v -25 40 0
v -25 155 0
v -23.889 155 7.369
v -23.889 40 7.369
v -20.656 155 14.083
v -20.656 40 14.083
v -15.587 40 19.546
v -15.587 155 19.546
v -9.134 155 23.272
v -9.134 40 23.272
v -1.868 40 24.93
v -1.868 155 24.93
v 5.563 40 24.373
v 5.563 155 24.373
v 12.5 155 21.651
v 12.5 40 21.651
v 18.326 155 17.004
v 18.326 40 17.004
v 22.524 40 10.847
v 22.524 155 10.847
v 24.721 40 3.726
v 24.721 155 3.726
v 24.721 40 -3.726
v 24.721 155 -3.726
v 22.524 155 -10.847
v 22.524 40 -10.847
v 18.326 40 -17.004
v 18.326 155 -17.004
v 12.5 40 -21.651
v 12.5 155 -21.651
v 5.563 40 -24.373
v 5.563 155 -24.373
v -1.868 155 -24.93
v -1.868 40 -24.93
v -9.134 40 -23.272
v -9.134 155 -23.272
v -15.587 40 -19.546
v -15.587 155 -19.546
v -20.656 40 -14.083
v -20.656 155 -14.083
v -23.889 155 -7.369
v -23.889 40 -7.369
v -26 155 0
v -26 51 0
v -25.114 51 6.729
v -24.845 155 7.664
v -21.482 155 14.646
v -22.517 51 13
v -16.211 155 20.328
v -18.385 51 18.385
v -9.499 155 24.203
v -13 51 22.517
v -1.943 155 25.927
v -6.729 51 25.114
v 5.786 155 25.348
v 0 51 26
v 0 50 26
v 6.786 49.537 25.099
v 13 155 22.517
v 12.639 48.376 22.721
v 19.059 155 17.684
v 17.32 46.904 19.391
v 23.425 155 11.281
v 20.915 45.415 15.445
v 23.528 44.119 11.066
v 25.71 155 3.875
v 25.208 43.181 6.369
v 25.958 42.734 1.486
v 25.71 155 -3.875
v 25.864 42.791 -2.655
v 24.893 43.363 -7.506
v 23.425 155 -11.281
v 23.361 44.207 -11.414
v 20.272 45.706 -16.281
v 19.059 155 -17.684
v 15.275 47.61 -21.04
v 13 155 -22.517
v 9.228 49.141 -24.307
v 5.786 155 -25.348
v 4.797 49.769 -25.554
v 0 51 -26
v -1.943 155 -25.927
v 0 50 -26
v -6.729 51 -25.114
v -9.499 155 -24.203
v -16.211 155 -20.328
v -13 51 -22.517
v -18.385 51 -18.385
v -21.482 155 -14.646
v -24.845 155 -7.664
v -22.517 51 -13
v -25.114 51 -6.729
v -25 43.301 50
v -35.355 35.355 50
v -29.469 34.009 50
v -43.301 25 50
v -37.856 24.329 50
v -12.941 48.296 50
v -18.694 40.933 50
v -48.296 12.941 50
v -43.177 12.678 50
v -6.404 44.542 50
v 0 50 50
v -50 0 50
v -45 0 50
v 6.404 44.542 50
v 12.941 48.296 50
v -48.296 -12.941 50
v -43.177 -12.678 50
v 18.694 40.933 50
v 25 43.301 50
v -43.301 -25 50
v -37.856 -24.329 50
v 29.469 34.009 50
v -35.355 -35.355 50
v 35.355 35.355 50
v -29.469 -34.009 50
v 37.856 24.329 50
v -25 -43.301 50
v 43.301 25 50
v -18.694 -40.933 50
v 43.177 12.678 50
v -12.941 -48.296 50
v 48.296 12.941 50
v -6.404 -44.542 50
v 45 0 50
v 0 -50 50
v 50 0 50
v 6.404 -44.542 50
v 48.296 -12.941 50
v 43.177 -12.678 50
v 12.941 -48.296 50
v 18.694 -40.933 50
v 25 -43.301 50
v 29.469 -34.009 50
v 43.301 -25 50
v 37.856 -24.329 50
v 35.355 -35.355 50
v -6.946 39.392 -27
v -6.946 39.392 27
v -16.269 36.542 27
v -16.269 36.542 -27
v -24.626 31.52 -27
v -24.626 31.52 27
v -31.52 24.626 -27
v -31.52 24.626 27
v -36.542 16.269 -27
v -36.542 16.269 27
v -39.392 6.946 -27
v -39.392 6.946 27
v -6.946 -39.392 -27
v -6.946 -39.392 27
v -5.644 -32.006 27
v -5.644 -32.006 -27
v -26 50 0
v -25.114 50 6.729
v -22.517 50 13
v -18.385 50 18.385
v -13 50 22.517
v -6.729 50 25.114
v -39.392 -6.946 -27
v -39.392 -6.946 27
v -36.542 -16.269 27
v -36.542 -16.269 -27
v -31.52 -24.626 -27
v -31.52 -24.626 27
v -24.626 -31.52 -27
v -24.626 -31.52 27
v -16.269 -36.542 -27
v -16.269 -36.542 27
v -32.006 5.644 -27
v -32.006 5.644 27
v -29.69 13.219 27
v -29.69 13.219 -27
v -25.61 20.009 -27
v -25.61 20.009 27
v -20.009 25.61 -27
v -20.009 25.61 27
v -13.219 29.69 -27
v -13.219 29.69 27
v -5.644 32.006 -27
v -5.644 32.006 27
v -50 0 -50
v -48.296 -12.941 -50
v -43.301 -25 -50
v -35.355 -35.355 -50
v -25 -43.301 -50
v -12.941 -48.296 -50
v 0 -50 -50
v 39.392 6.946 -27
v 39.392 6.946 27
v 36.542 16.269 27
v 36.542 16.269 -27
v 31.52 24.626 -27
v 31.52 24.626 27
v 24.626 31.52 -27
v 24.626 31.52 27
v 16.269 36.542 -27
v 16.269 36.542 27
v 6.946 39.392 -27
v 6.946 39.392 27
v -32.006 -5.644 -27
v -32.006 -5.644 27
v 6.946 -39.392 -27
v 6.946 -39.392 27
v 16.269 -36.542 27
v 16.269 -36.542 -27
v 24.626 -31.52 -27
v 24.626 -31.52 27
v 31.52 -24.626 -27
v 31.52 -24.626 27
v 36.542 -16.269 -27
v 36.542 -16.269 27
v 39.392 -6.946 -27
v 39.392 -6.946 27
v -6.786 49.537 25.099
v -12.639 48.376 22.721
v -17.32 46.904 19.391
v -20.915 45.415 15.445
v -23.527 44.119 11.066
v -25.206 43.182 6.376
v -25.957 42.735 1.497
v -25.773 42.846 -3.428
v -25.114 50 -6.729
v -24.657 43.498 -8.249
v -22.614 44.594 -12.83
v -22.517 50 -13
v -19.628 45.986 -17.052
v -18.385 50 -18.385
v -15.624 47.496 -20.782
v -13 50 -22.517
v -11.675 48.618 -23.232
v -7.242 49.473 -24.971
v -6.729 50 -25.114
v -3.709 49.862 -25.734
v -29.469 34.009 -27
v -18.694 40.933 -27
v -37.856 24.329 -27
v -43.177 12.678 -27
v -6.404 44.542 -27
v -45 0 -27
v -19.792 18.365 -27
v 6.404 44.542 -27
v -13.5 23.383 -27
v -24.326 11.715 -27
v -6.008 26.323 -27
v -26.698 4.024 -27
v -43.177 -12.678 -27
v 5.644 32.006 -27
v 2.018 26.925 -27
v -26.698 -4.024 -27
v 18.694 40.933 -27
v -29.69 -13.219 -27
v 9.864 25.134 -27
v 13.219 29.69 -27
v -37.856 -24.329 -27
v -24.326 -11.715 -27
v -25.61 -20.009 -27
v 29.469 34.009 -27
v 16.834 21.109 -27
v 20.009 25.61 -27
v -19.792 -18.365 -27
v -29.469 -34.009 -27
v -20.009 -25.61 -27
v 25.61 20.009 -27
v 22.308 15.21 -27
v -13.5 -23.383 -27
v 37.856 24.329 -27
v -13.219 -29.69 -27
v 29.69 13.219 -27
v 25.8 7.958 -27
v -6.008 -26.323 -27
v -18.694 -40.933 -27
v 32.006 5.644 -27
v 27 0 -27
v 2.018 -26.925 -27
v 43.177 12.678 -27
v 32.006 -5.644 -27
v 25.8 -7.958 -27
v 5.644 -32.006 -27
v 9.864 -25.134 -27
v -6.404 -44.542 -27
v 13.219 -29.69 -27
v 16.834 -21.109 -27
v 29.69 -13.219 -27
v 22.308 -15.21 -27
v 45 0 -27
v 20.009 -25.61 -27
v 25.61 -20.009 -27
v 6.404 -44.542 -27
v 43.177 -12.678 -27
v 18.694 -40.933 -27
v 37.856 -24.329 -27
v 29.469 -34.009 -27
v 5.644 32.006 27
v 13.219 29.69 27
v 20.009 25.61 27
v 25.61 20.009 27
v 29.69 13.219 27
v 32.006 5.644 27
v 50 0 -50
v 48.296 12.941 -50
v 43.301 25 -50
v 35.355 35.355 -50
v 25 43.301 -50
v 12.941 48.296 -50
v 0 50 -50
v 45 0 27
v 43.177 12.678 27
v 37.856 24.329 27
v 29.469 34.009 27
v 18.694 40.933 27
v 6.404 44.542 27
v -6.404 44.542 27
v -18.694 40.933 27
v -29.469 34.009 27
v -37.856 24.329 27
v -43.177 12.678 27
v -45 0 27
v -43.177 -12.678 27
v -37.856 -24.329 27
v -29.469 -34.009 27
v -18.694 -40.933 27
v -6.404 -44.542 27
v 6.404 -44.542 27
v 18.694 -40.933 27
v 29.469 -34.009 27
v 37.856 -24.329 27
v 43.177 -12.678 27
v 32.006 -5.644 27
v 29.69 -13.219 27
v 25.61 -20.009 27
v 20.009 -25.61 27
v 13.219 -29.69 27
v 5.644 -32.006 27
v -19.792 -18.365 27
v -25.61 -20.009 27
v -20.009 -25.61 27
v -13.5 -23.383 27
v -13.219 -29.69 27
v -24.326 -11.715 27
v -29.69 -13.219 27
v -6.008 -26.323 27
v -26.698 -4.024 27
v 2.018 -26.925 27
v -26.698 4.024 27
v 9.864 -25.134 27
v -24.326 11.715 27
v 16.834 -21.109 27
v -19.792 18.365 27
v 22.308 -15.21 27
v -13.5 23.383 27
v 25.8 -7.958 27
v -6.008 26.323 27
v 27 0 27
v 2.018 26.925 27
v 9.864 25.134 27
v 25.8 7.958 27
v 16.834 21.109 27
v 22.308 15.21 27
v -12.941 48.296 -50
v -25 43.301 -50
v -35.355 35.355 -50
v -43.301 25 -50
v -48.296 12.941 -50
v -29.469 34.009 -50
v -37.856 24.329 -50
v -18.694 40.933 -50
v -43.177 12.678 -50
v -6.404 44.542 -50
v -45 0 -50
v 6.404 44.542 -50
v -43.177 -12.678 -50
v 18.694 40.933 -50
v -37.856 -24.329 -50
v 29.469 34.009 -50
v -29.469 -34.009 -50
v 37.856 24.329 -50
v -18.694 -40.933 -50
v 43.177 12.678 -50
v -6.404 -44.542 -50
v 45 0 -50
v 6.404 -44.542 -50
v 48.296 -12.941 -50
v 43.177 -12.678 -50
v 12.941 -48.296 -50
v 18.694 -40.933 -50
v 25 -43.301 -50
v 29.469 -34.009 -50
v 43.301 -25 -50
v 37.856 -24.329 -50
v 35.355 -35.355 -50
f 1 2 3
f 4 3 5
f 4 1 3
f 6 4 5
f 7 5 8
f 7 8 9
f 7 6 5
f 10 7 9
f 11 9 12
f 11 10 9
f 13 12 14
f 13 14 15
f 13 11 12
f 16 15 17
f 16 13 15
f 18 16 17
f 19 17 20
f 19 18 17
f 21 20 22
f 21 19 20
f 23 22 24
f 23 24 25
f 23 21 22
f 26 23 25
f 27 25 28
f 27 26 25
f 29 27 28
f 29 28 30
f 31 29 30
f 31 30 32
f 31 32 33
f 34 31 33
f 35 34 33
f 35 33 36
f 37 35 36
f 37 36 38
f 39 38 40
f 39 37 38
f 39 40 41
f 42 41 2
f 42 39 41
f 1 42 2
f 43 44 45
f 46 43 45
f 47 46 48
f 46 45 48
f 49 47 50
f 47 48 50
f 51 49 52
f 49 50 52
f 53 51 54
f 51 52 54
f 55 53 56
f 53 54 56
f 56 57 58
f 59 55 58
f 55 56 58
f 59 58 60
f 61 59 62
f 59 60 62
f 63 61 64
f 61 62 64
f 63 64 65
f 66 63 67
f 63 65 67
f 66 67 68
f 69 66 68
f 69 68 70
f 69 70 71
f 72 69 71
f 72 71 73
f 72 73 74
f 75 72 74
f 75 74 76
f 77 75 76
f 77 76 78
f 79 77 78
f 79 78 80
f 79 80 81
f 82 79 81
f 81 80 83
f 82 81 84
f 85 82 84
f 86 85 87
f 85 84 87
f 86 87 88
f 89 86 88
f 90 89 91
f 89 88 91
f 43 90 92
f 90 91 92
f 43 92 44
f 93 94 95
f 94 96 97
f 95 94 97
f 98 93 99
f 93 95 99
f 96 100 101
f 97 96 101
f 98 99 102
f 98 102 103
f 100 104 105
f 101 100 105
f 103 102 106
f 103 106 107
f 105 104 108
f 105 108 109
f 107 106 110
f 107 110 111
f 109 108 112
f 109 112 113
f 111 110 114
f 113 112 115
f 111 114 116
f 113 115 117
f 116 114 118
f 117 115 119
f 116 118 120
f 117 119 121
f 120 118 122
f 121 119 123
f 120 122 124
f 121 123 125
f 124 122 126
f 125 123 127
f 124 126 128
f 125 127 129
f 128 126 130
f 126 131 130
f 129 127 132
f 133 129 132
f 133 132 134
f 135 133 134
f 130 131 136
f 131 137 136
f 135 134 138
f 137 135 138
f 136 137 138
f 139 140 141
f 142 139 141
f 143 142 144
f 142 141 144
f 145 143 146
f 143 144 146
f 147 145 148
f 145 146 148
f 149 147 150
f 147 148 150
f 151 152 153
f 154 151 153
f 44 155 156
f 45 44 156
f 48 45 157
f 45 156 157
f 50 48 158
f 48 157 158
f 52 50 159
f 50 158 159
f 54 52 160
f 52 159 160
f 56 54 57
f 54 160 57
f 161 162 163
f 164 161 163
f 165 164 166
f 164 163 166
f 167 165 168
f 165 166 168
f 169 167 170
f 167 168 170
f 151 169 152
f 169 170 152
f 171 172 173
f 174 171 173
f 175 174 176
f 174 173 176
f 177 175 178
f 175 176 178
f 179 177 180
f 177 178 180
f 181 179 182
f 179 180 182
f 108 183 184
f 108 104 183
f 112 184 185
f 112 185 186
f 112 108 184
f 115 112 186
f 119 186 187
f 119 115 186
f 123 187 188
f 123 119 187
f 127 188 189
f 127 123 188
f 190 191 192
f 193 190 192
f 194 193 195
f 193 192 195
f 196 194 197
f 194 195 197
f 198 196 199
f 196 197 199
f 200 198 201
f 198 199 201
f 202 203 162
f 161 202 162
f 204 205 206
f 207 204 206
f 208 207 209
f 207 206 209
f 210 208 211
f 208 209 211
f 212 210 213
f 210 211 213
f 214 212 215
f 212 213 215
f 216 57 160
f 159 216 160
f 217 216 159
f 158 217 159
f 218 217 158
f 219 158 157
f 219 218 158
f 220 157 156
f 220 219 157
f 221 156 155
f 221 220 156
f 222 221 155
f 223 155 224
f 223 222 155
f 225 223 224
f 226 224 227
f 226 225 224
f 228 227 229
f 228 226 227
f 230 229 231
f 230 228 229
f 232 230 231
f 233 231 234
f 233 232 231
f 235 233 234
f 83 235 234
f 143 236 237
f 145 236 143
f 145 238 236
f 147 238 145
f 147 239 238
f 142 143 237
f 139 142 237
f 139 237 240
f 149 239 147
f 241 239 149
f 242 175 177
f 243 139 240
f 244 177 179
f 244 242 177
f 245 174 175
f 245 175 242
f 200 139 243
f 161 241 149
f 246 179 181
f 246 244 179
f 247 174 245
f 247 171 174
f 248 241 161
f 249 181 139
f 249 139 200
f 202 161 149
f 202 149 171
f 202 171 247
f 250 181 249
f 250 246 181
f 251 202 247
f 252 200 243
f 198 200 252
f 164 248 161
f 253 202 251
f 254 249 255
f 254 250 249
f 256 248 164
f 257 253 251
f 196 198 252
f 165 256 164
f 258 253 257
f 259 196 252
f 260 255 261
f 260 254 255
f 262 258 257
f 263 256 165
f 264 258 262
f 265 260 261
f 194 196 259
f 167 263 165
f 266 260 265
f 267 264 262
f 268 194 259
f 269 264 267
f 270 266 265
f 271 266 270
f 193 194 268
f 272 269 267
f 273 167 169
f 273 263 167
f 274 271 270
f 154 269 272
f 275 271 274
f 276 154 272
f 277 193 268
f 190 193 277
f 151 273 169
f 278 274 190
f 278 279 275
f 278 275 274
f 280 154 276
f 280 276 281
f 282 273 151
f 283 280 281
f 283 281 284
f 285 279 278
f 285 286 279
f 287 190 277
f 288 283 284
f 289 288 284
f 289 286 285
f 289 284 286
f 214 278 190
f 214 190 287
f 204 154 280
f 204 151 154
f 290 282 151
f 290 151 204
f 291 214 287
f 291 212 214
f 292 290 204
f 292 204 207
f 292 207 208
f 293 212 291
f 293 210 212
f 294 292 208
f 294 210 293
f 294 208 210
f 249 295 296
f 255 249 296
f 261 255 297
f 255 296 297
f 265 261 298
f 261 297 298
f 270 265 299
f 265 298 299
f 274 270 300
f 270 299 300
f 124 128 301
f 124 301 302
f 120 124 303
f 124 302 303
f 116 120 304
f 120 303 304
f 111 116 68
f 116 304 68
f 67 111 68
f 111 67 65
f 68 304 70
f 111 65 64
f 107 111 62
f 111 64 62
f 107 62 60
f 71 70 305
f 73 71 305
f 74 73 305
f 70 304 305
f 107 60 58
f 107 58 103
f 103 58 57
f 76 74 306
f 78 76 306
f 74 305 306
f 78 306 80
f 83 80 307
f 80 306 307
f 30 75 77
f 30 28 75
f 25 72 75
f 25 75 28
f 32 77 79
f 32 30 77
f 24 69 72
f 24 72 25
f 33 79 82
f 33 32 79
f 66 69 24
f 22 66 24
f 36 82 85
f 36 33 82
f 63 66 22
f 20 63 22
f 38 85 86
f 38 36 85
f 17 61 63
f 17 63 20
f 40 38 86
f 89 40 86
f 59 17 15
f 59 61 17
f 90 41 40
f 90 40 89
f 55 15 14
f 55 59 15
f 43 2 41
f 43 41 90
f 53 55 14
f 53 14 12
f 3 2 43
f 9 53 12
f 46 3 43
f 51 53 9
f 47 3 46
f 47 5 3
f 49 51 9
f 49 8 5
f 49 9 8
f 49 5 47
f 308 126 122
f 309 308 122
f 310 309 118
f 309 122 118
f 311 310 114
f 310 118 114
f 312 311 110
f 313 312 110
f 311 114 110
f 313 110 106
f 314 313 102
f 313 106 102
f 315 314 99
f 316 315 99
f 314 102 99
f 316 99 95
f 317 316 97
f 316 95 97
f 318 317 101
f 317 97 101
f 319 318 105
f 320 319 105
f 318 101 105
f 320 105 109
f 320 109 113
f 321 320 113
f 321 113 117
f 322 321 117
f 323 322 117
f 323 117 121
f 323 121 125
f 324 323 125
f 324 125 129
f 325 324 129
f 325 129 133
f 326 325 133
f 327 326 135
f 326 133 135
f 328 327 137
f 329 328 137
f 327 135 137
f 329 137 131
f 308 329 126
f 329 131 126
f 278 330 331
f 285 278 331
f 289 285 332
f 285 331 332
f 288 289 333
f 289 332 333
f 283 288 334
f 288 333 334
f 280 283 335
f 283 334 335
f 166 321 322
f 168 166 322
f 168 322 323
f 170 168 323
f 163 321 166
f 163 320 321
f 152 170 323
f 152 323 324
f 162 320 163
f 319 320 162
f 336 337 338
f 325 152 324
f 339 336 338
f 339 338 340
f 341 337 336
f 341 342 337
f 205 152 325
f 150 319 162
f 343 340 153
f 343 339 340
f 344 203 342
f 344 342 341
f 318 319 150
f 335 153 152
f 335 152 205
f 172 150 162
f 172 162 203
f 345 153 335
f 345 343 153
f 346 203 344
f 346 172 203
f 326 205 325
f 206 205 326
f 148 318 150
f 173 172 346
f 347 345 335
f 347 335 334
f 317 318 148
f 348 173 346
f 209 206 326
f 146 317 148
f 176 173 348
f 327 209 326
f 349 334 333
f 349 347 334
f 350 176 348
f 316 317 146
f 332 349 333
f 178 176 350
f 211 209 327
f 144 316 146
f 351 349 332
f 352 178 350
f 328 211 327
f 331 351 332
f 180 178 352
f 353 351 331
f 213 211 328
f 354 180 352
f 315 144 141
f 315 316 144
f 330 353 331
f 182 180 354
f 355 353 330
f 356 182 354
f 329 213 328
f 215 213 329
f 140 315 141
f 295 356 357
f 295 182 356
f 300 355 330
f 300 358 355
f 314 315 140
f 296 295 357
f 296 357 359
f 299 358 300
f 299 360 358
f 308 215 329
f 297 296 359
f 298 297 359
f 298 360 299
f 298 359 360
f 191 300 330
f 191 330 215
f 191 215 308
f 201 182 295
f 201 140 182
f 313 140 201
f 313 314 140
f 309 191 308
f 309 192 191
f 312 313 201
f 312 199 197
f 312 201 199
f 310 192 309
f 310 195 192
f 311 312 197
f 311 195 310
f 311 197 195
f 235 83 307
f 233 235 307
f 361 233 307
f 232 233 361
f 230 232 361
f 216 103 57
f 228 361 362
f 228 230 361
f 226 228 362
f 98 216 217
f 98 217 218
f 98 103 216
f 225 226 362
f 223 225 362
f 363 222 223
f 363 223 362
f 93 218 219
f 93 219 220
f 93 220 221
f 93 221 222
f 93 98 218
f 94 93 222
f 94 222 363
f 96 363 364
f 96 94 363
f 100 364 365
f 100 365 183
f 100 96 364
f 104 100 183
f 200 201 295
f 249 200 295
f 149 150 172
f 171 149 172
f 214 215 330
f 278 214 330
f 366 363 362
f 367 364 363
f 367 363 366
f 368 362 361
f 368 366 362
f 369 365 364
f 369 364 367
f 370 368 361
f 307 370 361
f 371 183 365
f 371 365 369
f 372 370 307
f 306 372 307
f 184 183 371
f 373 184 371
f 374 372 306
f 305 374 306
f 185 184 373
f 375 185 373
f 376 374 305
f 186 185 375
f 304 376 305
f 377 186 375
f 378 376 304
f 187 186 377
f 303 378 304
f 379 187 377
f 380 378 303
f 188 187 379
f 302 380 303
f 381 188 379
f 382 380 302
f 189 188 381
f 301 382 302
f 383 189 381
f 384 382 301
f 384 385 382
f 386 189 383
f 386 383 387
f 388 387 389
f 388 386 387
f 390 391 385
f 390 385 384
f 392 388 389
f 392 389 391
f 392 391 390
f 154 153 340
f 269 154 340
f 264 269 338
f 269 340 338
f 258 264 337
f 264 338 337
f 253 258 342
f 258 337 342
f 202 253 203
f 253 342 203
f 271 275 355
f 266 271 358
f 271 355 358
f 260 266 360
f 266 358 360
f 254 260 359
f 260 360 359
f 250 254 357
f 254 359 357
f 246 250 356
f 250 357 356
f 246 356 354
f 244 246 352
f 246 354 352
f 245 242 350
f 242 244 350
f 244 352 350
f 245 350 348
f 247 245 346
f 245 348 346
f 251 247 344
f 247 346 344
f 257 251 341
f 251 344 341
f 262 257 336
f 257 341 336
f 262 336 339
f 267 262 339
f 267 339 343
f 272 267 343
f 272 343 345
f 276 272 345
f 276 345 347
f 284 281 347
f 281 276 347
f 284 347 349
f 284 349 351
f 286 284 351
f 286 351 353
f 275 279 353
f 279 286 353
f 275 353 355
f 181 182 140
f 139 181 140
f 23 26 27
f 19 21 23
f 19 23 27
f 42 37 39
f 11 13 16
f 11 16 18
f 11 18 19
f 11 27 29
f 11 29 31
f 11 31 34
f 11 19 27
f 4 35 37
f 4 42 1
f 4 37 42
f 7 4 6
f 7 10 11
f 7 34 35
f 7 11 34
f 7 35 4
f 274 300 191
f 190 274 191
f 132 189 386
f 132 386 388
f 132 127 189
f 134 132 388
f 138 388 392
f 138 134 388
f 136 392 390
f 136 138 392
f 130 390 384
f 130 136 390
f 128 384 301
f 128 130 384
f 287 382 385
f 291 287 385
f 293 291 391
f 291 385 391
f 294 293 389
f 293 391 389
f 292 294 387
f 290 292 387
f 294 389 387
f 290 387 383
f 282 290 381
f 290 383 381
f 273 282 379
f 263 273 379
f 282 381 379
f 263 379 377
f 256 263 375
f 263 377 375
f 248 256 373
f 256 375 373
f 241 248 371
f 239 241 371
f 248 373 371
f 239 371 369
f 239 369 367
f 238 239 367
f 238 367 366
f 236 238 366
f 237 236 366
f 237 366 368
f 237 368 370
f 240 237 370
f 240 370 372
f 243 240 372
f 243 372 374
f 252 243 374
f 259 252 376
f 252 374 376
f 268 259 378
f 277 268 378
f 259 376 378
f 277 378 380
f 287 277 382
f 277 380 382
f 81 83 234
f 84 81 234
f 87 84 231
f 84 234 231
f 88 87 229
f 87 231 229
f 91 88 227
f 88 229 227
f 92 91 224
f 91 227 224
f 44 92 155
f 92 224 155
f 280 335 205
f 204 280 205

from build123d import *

# Parameters (mm, degrees)
F0_W          = 100
F0_H          = 100
F1_DEPTH      = 50
F2_R          = 27
F3_DEPTH      = 100.001
F4_R          = 45
F5_DEPTH      = 23
F6_R          = 45
F6_R_2        = 27
F7_DEPTH      = 23
F8_R          = 49.99999
F9_R          = 25
F10_DEPTH     = 10
F11_R         = 26
F11_R_2       = 25
F12_DEPTH     = 105
F13_T4_DEPTH  = 100
F13_S5_R      = 26
F13_T6_DEPTH  = 63
F13_T10_DEPTH = 100
F13_S11_R     = 26
F13_T12_DEPTH = 63
F15_DEPTH     = 77.0010001


# Not quite as in the source:
# - a fillet or chamfer that OpenCascade refuses, or shapes differently, is made with other operations: its cross-section is extruded or revolved along the edge and cut away or added
# - a fillet or chamfer is up to 0.001 mm smaller than in the source, because OpenCascade refuses the exact size


with BuildPart() as f1:
    # F0 (on Front) → F1 (new body, symmetric)
    with BuildSketch(Plane.XZ):
        Rectangle(F0_W, F0_H)
    extrude(amount=F1_DEPTH, both=True)

    # F2 (on face) → F3 (cut, through all)
    with BuildSketch(Plane.XY.offset(50)):
        Circle(F2_R)
    extrude(amount=-F3_DEPTH, mode=Mode.SUBTRACT)

    # F4 (on face) → F5 (cut)
    with BuildSketch(Plane.XY.offset(50)):
        Circle(F4_R)
    extrude(amount=-F5_DEPTH, mode=Mode.SUBTRACT)

    # F6 (on face) → F7 (cut)
    with BuildSketch(Plane(origin=(0, 0, -50), x_dir=(1, 0, 0), z_dir=(0, 0, -1))):
        Circle(F6_R)
        Circle(F6_R_2, mode=Mode.SUBTRACT)
    extrude(amount=-F7_DEPTH, mode=Mode.SUBTRACT)

    # F8 (radius 50 in the source; OpenCascade refuses exactly that, so slightly less here)
    f8_edges = [f1.edges().sort_by_distance(p)[0] for p in [
        (50, -50, 0),
        (-50, -50, 0),
    ]]
    fillet(f8_edges, radius=F8_R)

    # F9 (on face) → F10 (cut)
    with BuildSketch(Plane(origin=(0, 50, 0), x_dir=(-1, 0, 0), z_dir=(0, 1, 0))):
        Circle(F9_R)
    extrude(amount=-F10_DEPTH, mode=Mode.SUBTRACT)

    # F11 (on face) → F12 (join)
    with BuildSketch(Plane(origin=(0, 50, 0), x_dir=(-1, 0, 0), z_dir=(0, 1, 0))):
        Circle(F11_R)
        Circle(F11_R_2, mode=Mode.SUBTRACT)
    extrude(amount=F12_DEPTH)

    # F13: fillet of radius 50 on 2 edges, made by hand


with BuildPart() as f13_tool2:
    # F13_s3 → F13_t4 (new body)
    with BuildSketch(Plane.XY.offset(-50)):
        with BuildLine():
            ThreePointArc((50, 0), (35.3553390593, 35.3553390593), (0, 50))
            Line((0, 50), (0, 51))
            Line((0, 51), (51, 51))
            Line((51, 51), (51, 0))
            Line((51, 0), (50, 0))
        make_face()
    extrude(amount=F13_T4_DEPTH)

    # F13_s5 → F13_t6 (cut, symmetric)
    with BuildSketch(Plane.XZ.offset(-25.5)):
        Circle(F13_S5_R)
    extrude(amount=F13_T6_DEPTH, both=True, mode=Mode.SUBTRACT)


with BuildPart() as f1_1:
    add(f1.part)

    # F13_t1: cut F13_tool2
    add(f13_tool2.part, mode=Mode.SUBTRACT)


with BuildPart() as f13_tool8:
    # F13_s9 → F13_t10 (new body)
    with BuildSketch(Plane.XY.offset(50)):
        with BuildLine():
            ThreePointArc((0, 50), (-35.3553390593, 35.3553390593), (-50, 0))
            Line((-50, 0), (-51, 0))
            Line((-51, 0), (-51, 51))
            Line((-51, 51), (0, 51))
            Line((0, 51), (0, 50))
        make_face()
    extrude(amount=-F13_T10_DEPTH)

    # F13_s11 → F13_t12 (cut, symmetric)
    with BuildSketch(Plane.XZ.offset(-25.5)):
        Circle(F13_S11_R)
    extrude(amount=F13_T12_DEPTH, both=True, mode=Mode.SUBTRACT)


with BuildPart() as f1_2:
    add(f1_1.part)

    # F13_t7: cut F13_tool8
    add(f13_tool8.part, mode=Mode.SUBTRACT)

    # F14 (on face) → F15 (cut, through all)
    with BuildSketch(Plane.XY.offset(27)):
        with BuildLine():
            ThreePointArc((-32.0062519729, 5.6435657742), (-22.9809703886, 22.9809703886), (-5.6435657742, 32.0062519729))
            Line((-5.6435657742, 32.0062519729), (-6.9459271067, 39.3923101205))
            ThreePointArc((-6.9459271067, 39.3923101205), (-28.2842712475, 28.2842712475), (-39.3923101205, 6.9459271067))
            Line((-39.3923101205, 6.9459271067), (-32.0062519729, 5.6435657742))
        make_face()
        with BuildLine():
            ThreePointArc((5.6435657742, 32.0062519729), (22.9809703886, 22.9809703886), (32.0062519729, 5.6435657742))
            Line((32.0062519729, 5.6435657742), (39.3923101205, 6.9459271067))
            ThreePointArc((39.3923101205, 6.9459271067), (28.2842712475, 28.2842712475), (6.9459271067, 39.3923101205))
            Line((6.9459271067, 39.3923101205), (5.6435657742, 32.0062519729))
        make_face()
        with BuildLine():
            Line((39.3923101205, -6.9459271067), (32.0062519729, -5.6435657742))
            ThreePointArc((32.0062519729, -5.6435657742), (22.9809703886, -22.9809703886), (5.6435657742, -32.0062519729))
            Line((5.6435657742, -32.0062519729), (6.9459271067, -39.3923101205))
            ThreePointArc((6.9459271067, -39.3923101205), (28.2842712475, -28.2842712475), (39.3923101205, -6.9459271067))
        make_face()
        with BuildLine():
            Line((-6.9459271067, -39.3923101205), (-5.6435657742, -32.0062519729))
            ThreePointArc((-5.6435657742, -32.0062519729), (-22.9809703886, -22.9809703886), (-32.0062519729, -5.6435657742))
            Line((-32.0062519729, -5.6435657742), (-39.3923101205, -6.9459271067))
            ThreePointArc((-39.3923101205, -6.9459271067), (-28.2842712475, -28.2842712475), (-6.9459271067, -39.3923101205))
        make_face()
    extrude(amount=-F15_DEPTH, mode=Mode.SUBTRACT)


solid = f1_2.part
